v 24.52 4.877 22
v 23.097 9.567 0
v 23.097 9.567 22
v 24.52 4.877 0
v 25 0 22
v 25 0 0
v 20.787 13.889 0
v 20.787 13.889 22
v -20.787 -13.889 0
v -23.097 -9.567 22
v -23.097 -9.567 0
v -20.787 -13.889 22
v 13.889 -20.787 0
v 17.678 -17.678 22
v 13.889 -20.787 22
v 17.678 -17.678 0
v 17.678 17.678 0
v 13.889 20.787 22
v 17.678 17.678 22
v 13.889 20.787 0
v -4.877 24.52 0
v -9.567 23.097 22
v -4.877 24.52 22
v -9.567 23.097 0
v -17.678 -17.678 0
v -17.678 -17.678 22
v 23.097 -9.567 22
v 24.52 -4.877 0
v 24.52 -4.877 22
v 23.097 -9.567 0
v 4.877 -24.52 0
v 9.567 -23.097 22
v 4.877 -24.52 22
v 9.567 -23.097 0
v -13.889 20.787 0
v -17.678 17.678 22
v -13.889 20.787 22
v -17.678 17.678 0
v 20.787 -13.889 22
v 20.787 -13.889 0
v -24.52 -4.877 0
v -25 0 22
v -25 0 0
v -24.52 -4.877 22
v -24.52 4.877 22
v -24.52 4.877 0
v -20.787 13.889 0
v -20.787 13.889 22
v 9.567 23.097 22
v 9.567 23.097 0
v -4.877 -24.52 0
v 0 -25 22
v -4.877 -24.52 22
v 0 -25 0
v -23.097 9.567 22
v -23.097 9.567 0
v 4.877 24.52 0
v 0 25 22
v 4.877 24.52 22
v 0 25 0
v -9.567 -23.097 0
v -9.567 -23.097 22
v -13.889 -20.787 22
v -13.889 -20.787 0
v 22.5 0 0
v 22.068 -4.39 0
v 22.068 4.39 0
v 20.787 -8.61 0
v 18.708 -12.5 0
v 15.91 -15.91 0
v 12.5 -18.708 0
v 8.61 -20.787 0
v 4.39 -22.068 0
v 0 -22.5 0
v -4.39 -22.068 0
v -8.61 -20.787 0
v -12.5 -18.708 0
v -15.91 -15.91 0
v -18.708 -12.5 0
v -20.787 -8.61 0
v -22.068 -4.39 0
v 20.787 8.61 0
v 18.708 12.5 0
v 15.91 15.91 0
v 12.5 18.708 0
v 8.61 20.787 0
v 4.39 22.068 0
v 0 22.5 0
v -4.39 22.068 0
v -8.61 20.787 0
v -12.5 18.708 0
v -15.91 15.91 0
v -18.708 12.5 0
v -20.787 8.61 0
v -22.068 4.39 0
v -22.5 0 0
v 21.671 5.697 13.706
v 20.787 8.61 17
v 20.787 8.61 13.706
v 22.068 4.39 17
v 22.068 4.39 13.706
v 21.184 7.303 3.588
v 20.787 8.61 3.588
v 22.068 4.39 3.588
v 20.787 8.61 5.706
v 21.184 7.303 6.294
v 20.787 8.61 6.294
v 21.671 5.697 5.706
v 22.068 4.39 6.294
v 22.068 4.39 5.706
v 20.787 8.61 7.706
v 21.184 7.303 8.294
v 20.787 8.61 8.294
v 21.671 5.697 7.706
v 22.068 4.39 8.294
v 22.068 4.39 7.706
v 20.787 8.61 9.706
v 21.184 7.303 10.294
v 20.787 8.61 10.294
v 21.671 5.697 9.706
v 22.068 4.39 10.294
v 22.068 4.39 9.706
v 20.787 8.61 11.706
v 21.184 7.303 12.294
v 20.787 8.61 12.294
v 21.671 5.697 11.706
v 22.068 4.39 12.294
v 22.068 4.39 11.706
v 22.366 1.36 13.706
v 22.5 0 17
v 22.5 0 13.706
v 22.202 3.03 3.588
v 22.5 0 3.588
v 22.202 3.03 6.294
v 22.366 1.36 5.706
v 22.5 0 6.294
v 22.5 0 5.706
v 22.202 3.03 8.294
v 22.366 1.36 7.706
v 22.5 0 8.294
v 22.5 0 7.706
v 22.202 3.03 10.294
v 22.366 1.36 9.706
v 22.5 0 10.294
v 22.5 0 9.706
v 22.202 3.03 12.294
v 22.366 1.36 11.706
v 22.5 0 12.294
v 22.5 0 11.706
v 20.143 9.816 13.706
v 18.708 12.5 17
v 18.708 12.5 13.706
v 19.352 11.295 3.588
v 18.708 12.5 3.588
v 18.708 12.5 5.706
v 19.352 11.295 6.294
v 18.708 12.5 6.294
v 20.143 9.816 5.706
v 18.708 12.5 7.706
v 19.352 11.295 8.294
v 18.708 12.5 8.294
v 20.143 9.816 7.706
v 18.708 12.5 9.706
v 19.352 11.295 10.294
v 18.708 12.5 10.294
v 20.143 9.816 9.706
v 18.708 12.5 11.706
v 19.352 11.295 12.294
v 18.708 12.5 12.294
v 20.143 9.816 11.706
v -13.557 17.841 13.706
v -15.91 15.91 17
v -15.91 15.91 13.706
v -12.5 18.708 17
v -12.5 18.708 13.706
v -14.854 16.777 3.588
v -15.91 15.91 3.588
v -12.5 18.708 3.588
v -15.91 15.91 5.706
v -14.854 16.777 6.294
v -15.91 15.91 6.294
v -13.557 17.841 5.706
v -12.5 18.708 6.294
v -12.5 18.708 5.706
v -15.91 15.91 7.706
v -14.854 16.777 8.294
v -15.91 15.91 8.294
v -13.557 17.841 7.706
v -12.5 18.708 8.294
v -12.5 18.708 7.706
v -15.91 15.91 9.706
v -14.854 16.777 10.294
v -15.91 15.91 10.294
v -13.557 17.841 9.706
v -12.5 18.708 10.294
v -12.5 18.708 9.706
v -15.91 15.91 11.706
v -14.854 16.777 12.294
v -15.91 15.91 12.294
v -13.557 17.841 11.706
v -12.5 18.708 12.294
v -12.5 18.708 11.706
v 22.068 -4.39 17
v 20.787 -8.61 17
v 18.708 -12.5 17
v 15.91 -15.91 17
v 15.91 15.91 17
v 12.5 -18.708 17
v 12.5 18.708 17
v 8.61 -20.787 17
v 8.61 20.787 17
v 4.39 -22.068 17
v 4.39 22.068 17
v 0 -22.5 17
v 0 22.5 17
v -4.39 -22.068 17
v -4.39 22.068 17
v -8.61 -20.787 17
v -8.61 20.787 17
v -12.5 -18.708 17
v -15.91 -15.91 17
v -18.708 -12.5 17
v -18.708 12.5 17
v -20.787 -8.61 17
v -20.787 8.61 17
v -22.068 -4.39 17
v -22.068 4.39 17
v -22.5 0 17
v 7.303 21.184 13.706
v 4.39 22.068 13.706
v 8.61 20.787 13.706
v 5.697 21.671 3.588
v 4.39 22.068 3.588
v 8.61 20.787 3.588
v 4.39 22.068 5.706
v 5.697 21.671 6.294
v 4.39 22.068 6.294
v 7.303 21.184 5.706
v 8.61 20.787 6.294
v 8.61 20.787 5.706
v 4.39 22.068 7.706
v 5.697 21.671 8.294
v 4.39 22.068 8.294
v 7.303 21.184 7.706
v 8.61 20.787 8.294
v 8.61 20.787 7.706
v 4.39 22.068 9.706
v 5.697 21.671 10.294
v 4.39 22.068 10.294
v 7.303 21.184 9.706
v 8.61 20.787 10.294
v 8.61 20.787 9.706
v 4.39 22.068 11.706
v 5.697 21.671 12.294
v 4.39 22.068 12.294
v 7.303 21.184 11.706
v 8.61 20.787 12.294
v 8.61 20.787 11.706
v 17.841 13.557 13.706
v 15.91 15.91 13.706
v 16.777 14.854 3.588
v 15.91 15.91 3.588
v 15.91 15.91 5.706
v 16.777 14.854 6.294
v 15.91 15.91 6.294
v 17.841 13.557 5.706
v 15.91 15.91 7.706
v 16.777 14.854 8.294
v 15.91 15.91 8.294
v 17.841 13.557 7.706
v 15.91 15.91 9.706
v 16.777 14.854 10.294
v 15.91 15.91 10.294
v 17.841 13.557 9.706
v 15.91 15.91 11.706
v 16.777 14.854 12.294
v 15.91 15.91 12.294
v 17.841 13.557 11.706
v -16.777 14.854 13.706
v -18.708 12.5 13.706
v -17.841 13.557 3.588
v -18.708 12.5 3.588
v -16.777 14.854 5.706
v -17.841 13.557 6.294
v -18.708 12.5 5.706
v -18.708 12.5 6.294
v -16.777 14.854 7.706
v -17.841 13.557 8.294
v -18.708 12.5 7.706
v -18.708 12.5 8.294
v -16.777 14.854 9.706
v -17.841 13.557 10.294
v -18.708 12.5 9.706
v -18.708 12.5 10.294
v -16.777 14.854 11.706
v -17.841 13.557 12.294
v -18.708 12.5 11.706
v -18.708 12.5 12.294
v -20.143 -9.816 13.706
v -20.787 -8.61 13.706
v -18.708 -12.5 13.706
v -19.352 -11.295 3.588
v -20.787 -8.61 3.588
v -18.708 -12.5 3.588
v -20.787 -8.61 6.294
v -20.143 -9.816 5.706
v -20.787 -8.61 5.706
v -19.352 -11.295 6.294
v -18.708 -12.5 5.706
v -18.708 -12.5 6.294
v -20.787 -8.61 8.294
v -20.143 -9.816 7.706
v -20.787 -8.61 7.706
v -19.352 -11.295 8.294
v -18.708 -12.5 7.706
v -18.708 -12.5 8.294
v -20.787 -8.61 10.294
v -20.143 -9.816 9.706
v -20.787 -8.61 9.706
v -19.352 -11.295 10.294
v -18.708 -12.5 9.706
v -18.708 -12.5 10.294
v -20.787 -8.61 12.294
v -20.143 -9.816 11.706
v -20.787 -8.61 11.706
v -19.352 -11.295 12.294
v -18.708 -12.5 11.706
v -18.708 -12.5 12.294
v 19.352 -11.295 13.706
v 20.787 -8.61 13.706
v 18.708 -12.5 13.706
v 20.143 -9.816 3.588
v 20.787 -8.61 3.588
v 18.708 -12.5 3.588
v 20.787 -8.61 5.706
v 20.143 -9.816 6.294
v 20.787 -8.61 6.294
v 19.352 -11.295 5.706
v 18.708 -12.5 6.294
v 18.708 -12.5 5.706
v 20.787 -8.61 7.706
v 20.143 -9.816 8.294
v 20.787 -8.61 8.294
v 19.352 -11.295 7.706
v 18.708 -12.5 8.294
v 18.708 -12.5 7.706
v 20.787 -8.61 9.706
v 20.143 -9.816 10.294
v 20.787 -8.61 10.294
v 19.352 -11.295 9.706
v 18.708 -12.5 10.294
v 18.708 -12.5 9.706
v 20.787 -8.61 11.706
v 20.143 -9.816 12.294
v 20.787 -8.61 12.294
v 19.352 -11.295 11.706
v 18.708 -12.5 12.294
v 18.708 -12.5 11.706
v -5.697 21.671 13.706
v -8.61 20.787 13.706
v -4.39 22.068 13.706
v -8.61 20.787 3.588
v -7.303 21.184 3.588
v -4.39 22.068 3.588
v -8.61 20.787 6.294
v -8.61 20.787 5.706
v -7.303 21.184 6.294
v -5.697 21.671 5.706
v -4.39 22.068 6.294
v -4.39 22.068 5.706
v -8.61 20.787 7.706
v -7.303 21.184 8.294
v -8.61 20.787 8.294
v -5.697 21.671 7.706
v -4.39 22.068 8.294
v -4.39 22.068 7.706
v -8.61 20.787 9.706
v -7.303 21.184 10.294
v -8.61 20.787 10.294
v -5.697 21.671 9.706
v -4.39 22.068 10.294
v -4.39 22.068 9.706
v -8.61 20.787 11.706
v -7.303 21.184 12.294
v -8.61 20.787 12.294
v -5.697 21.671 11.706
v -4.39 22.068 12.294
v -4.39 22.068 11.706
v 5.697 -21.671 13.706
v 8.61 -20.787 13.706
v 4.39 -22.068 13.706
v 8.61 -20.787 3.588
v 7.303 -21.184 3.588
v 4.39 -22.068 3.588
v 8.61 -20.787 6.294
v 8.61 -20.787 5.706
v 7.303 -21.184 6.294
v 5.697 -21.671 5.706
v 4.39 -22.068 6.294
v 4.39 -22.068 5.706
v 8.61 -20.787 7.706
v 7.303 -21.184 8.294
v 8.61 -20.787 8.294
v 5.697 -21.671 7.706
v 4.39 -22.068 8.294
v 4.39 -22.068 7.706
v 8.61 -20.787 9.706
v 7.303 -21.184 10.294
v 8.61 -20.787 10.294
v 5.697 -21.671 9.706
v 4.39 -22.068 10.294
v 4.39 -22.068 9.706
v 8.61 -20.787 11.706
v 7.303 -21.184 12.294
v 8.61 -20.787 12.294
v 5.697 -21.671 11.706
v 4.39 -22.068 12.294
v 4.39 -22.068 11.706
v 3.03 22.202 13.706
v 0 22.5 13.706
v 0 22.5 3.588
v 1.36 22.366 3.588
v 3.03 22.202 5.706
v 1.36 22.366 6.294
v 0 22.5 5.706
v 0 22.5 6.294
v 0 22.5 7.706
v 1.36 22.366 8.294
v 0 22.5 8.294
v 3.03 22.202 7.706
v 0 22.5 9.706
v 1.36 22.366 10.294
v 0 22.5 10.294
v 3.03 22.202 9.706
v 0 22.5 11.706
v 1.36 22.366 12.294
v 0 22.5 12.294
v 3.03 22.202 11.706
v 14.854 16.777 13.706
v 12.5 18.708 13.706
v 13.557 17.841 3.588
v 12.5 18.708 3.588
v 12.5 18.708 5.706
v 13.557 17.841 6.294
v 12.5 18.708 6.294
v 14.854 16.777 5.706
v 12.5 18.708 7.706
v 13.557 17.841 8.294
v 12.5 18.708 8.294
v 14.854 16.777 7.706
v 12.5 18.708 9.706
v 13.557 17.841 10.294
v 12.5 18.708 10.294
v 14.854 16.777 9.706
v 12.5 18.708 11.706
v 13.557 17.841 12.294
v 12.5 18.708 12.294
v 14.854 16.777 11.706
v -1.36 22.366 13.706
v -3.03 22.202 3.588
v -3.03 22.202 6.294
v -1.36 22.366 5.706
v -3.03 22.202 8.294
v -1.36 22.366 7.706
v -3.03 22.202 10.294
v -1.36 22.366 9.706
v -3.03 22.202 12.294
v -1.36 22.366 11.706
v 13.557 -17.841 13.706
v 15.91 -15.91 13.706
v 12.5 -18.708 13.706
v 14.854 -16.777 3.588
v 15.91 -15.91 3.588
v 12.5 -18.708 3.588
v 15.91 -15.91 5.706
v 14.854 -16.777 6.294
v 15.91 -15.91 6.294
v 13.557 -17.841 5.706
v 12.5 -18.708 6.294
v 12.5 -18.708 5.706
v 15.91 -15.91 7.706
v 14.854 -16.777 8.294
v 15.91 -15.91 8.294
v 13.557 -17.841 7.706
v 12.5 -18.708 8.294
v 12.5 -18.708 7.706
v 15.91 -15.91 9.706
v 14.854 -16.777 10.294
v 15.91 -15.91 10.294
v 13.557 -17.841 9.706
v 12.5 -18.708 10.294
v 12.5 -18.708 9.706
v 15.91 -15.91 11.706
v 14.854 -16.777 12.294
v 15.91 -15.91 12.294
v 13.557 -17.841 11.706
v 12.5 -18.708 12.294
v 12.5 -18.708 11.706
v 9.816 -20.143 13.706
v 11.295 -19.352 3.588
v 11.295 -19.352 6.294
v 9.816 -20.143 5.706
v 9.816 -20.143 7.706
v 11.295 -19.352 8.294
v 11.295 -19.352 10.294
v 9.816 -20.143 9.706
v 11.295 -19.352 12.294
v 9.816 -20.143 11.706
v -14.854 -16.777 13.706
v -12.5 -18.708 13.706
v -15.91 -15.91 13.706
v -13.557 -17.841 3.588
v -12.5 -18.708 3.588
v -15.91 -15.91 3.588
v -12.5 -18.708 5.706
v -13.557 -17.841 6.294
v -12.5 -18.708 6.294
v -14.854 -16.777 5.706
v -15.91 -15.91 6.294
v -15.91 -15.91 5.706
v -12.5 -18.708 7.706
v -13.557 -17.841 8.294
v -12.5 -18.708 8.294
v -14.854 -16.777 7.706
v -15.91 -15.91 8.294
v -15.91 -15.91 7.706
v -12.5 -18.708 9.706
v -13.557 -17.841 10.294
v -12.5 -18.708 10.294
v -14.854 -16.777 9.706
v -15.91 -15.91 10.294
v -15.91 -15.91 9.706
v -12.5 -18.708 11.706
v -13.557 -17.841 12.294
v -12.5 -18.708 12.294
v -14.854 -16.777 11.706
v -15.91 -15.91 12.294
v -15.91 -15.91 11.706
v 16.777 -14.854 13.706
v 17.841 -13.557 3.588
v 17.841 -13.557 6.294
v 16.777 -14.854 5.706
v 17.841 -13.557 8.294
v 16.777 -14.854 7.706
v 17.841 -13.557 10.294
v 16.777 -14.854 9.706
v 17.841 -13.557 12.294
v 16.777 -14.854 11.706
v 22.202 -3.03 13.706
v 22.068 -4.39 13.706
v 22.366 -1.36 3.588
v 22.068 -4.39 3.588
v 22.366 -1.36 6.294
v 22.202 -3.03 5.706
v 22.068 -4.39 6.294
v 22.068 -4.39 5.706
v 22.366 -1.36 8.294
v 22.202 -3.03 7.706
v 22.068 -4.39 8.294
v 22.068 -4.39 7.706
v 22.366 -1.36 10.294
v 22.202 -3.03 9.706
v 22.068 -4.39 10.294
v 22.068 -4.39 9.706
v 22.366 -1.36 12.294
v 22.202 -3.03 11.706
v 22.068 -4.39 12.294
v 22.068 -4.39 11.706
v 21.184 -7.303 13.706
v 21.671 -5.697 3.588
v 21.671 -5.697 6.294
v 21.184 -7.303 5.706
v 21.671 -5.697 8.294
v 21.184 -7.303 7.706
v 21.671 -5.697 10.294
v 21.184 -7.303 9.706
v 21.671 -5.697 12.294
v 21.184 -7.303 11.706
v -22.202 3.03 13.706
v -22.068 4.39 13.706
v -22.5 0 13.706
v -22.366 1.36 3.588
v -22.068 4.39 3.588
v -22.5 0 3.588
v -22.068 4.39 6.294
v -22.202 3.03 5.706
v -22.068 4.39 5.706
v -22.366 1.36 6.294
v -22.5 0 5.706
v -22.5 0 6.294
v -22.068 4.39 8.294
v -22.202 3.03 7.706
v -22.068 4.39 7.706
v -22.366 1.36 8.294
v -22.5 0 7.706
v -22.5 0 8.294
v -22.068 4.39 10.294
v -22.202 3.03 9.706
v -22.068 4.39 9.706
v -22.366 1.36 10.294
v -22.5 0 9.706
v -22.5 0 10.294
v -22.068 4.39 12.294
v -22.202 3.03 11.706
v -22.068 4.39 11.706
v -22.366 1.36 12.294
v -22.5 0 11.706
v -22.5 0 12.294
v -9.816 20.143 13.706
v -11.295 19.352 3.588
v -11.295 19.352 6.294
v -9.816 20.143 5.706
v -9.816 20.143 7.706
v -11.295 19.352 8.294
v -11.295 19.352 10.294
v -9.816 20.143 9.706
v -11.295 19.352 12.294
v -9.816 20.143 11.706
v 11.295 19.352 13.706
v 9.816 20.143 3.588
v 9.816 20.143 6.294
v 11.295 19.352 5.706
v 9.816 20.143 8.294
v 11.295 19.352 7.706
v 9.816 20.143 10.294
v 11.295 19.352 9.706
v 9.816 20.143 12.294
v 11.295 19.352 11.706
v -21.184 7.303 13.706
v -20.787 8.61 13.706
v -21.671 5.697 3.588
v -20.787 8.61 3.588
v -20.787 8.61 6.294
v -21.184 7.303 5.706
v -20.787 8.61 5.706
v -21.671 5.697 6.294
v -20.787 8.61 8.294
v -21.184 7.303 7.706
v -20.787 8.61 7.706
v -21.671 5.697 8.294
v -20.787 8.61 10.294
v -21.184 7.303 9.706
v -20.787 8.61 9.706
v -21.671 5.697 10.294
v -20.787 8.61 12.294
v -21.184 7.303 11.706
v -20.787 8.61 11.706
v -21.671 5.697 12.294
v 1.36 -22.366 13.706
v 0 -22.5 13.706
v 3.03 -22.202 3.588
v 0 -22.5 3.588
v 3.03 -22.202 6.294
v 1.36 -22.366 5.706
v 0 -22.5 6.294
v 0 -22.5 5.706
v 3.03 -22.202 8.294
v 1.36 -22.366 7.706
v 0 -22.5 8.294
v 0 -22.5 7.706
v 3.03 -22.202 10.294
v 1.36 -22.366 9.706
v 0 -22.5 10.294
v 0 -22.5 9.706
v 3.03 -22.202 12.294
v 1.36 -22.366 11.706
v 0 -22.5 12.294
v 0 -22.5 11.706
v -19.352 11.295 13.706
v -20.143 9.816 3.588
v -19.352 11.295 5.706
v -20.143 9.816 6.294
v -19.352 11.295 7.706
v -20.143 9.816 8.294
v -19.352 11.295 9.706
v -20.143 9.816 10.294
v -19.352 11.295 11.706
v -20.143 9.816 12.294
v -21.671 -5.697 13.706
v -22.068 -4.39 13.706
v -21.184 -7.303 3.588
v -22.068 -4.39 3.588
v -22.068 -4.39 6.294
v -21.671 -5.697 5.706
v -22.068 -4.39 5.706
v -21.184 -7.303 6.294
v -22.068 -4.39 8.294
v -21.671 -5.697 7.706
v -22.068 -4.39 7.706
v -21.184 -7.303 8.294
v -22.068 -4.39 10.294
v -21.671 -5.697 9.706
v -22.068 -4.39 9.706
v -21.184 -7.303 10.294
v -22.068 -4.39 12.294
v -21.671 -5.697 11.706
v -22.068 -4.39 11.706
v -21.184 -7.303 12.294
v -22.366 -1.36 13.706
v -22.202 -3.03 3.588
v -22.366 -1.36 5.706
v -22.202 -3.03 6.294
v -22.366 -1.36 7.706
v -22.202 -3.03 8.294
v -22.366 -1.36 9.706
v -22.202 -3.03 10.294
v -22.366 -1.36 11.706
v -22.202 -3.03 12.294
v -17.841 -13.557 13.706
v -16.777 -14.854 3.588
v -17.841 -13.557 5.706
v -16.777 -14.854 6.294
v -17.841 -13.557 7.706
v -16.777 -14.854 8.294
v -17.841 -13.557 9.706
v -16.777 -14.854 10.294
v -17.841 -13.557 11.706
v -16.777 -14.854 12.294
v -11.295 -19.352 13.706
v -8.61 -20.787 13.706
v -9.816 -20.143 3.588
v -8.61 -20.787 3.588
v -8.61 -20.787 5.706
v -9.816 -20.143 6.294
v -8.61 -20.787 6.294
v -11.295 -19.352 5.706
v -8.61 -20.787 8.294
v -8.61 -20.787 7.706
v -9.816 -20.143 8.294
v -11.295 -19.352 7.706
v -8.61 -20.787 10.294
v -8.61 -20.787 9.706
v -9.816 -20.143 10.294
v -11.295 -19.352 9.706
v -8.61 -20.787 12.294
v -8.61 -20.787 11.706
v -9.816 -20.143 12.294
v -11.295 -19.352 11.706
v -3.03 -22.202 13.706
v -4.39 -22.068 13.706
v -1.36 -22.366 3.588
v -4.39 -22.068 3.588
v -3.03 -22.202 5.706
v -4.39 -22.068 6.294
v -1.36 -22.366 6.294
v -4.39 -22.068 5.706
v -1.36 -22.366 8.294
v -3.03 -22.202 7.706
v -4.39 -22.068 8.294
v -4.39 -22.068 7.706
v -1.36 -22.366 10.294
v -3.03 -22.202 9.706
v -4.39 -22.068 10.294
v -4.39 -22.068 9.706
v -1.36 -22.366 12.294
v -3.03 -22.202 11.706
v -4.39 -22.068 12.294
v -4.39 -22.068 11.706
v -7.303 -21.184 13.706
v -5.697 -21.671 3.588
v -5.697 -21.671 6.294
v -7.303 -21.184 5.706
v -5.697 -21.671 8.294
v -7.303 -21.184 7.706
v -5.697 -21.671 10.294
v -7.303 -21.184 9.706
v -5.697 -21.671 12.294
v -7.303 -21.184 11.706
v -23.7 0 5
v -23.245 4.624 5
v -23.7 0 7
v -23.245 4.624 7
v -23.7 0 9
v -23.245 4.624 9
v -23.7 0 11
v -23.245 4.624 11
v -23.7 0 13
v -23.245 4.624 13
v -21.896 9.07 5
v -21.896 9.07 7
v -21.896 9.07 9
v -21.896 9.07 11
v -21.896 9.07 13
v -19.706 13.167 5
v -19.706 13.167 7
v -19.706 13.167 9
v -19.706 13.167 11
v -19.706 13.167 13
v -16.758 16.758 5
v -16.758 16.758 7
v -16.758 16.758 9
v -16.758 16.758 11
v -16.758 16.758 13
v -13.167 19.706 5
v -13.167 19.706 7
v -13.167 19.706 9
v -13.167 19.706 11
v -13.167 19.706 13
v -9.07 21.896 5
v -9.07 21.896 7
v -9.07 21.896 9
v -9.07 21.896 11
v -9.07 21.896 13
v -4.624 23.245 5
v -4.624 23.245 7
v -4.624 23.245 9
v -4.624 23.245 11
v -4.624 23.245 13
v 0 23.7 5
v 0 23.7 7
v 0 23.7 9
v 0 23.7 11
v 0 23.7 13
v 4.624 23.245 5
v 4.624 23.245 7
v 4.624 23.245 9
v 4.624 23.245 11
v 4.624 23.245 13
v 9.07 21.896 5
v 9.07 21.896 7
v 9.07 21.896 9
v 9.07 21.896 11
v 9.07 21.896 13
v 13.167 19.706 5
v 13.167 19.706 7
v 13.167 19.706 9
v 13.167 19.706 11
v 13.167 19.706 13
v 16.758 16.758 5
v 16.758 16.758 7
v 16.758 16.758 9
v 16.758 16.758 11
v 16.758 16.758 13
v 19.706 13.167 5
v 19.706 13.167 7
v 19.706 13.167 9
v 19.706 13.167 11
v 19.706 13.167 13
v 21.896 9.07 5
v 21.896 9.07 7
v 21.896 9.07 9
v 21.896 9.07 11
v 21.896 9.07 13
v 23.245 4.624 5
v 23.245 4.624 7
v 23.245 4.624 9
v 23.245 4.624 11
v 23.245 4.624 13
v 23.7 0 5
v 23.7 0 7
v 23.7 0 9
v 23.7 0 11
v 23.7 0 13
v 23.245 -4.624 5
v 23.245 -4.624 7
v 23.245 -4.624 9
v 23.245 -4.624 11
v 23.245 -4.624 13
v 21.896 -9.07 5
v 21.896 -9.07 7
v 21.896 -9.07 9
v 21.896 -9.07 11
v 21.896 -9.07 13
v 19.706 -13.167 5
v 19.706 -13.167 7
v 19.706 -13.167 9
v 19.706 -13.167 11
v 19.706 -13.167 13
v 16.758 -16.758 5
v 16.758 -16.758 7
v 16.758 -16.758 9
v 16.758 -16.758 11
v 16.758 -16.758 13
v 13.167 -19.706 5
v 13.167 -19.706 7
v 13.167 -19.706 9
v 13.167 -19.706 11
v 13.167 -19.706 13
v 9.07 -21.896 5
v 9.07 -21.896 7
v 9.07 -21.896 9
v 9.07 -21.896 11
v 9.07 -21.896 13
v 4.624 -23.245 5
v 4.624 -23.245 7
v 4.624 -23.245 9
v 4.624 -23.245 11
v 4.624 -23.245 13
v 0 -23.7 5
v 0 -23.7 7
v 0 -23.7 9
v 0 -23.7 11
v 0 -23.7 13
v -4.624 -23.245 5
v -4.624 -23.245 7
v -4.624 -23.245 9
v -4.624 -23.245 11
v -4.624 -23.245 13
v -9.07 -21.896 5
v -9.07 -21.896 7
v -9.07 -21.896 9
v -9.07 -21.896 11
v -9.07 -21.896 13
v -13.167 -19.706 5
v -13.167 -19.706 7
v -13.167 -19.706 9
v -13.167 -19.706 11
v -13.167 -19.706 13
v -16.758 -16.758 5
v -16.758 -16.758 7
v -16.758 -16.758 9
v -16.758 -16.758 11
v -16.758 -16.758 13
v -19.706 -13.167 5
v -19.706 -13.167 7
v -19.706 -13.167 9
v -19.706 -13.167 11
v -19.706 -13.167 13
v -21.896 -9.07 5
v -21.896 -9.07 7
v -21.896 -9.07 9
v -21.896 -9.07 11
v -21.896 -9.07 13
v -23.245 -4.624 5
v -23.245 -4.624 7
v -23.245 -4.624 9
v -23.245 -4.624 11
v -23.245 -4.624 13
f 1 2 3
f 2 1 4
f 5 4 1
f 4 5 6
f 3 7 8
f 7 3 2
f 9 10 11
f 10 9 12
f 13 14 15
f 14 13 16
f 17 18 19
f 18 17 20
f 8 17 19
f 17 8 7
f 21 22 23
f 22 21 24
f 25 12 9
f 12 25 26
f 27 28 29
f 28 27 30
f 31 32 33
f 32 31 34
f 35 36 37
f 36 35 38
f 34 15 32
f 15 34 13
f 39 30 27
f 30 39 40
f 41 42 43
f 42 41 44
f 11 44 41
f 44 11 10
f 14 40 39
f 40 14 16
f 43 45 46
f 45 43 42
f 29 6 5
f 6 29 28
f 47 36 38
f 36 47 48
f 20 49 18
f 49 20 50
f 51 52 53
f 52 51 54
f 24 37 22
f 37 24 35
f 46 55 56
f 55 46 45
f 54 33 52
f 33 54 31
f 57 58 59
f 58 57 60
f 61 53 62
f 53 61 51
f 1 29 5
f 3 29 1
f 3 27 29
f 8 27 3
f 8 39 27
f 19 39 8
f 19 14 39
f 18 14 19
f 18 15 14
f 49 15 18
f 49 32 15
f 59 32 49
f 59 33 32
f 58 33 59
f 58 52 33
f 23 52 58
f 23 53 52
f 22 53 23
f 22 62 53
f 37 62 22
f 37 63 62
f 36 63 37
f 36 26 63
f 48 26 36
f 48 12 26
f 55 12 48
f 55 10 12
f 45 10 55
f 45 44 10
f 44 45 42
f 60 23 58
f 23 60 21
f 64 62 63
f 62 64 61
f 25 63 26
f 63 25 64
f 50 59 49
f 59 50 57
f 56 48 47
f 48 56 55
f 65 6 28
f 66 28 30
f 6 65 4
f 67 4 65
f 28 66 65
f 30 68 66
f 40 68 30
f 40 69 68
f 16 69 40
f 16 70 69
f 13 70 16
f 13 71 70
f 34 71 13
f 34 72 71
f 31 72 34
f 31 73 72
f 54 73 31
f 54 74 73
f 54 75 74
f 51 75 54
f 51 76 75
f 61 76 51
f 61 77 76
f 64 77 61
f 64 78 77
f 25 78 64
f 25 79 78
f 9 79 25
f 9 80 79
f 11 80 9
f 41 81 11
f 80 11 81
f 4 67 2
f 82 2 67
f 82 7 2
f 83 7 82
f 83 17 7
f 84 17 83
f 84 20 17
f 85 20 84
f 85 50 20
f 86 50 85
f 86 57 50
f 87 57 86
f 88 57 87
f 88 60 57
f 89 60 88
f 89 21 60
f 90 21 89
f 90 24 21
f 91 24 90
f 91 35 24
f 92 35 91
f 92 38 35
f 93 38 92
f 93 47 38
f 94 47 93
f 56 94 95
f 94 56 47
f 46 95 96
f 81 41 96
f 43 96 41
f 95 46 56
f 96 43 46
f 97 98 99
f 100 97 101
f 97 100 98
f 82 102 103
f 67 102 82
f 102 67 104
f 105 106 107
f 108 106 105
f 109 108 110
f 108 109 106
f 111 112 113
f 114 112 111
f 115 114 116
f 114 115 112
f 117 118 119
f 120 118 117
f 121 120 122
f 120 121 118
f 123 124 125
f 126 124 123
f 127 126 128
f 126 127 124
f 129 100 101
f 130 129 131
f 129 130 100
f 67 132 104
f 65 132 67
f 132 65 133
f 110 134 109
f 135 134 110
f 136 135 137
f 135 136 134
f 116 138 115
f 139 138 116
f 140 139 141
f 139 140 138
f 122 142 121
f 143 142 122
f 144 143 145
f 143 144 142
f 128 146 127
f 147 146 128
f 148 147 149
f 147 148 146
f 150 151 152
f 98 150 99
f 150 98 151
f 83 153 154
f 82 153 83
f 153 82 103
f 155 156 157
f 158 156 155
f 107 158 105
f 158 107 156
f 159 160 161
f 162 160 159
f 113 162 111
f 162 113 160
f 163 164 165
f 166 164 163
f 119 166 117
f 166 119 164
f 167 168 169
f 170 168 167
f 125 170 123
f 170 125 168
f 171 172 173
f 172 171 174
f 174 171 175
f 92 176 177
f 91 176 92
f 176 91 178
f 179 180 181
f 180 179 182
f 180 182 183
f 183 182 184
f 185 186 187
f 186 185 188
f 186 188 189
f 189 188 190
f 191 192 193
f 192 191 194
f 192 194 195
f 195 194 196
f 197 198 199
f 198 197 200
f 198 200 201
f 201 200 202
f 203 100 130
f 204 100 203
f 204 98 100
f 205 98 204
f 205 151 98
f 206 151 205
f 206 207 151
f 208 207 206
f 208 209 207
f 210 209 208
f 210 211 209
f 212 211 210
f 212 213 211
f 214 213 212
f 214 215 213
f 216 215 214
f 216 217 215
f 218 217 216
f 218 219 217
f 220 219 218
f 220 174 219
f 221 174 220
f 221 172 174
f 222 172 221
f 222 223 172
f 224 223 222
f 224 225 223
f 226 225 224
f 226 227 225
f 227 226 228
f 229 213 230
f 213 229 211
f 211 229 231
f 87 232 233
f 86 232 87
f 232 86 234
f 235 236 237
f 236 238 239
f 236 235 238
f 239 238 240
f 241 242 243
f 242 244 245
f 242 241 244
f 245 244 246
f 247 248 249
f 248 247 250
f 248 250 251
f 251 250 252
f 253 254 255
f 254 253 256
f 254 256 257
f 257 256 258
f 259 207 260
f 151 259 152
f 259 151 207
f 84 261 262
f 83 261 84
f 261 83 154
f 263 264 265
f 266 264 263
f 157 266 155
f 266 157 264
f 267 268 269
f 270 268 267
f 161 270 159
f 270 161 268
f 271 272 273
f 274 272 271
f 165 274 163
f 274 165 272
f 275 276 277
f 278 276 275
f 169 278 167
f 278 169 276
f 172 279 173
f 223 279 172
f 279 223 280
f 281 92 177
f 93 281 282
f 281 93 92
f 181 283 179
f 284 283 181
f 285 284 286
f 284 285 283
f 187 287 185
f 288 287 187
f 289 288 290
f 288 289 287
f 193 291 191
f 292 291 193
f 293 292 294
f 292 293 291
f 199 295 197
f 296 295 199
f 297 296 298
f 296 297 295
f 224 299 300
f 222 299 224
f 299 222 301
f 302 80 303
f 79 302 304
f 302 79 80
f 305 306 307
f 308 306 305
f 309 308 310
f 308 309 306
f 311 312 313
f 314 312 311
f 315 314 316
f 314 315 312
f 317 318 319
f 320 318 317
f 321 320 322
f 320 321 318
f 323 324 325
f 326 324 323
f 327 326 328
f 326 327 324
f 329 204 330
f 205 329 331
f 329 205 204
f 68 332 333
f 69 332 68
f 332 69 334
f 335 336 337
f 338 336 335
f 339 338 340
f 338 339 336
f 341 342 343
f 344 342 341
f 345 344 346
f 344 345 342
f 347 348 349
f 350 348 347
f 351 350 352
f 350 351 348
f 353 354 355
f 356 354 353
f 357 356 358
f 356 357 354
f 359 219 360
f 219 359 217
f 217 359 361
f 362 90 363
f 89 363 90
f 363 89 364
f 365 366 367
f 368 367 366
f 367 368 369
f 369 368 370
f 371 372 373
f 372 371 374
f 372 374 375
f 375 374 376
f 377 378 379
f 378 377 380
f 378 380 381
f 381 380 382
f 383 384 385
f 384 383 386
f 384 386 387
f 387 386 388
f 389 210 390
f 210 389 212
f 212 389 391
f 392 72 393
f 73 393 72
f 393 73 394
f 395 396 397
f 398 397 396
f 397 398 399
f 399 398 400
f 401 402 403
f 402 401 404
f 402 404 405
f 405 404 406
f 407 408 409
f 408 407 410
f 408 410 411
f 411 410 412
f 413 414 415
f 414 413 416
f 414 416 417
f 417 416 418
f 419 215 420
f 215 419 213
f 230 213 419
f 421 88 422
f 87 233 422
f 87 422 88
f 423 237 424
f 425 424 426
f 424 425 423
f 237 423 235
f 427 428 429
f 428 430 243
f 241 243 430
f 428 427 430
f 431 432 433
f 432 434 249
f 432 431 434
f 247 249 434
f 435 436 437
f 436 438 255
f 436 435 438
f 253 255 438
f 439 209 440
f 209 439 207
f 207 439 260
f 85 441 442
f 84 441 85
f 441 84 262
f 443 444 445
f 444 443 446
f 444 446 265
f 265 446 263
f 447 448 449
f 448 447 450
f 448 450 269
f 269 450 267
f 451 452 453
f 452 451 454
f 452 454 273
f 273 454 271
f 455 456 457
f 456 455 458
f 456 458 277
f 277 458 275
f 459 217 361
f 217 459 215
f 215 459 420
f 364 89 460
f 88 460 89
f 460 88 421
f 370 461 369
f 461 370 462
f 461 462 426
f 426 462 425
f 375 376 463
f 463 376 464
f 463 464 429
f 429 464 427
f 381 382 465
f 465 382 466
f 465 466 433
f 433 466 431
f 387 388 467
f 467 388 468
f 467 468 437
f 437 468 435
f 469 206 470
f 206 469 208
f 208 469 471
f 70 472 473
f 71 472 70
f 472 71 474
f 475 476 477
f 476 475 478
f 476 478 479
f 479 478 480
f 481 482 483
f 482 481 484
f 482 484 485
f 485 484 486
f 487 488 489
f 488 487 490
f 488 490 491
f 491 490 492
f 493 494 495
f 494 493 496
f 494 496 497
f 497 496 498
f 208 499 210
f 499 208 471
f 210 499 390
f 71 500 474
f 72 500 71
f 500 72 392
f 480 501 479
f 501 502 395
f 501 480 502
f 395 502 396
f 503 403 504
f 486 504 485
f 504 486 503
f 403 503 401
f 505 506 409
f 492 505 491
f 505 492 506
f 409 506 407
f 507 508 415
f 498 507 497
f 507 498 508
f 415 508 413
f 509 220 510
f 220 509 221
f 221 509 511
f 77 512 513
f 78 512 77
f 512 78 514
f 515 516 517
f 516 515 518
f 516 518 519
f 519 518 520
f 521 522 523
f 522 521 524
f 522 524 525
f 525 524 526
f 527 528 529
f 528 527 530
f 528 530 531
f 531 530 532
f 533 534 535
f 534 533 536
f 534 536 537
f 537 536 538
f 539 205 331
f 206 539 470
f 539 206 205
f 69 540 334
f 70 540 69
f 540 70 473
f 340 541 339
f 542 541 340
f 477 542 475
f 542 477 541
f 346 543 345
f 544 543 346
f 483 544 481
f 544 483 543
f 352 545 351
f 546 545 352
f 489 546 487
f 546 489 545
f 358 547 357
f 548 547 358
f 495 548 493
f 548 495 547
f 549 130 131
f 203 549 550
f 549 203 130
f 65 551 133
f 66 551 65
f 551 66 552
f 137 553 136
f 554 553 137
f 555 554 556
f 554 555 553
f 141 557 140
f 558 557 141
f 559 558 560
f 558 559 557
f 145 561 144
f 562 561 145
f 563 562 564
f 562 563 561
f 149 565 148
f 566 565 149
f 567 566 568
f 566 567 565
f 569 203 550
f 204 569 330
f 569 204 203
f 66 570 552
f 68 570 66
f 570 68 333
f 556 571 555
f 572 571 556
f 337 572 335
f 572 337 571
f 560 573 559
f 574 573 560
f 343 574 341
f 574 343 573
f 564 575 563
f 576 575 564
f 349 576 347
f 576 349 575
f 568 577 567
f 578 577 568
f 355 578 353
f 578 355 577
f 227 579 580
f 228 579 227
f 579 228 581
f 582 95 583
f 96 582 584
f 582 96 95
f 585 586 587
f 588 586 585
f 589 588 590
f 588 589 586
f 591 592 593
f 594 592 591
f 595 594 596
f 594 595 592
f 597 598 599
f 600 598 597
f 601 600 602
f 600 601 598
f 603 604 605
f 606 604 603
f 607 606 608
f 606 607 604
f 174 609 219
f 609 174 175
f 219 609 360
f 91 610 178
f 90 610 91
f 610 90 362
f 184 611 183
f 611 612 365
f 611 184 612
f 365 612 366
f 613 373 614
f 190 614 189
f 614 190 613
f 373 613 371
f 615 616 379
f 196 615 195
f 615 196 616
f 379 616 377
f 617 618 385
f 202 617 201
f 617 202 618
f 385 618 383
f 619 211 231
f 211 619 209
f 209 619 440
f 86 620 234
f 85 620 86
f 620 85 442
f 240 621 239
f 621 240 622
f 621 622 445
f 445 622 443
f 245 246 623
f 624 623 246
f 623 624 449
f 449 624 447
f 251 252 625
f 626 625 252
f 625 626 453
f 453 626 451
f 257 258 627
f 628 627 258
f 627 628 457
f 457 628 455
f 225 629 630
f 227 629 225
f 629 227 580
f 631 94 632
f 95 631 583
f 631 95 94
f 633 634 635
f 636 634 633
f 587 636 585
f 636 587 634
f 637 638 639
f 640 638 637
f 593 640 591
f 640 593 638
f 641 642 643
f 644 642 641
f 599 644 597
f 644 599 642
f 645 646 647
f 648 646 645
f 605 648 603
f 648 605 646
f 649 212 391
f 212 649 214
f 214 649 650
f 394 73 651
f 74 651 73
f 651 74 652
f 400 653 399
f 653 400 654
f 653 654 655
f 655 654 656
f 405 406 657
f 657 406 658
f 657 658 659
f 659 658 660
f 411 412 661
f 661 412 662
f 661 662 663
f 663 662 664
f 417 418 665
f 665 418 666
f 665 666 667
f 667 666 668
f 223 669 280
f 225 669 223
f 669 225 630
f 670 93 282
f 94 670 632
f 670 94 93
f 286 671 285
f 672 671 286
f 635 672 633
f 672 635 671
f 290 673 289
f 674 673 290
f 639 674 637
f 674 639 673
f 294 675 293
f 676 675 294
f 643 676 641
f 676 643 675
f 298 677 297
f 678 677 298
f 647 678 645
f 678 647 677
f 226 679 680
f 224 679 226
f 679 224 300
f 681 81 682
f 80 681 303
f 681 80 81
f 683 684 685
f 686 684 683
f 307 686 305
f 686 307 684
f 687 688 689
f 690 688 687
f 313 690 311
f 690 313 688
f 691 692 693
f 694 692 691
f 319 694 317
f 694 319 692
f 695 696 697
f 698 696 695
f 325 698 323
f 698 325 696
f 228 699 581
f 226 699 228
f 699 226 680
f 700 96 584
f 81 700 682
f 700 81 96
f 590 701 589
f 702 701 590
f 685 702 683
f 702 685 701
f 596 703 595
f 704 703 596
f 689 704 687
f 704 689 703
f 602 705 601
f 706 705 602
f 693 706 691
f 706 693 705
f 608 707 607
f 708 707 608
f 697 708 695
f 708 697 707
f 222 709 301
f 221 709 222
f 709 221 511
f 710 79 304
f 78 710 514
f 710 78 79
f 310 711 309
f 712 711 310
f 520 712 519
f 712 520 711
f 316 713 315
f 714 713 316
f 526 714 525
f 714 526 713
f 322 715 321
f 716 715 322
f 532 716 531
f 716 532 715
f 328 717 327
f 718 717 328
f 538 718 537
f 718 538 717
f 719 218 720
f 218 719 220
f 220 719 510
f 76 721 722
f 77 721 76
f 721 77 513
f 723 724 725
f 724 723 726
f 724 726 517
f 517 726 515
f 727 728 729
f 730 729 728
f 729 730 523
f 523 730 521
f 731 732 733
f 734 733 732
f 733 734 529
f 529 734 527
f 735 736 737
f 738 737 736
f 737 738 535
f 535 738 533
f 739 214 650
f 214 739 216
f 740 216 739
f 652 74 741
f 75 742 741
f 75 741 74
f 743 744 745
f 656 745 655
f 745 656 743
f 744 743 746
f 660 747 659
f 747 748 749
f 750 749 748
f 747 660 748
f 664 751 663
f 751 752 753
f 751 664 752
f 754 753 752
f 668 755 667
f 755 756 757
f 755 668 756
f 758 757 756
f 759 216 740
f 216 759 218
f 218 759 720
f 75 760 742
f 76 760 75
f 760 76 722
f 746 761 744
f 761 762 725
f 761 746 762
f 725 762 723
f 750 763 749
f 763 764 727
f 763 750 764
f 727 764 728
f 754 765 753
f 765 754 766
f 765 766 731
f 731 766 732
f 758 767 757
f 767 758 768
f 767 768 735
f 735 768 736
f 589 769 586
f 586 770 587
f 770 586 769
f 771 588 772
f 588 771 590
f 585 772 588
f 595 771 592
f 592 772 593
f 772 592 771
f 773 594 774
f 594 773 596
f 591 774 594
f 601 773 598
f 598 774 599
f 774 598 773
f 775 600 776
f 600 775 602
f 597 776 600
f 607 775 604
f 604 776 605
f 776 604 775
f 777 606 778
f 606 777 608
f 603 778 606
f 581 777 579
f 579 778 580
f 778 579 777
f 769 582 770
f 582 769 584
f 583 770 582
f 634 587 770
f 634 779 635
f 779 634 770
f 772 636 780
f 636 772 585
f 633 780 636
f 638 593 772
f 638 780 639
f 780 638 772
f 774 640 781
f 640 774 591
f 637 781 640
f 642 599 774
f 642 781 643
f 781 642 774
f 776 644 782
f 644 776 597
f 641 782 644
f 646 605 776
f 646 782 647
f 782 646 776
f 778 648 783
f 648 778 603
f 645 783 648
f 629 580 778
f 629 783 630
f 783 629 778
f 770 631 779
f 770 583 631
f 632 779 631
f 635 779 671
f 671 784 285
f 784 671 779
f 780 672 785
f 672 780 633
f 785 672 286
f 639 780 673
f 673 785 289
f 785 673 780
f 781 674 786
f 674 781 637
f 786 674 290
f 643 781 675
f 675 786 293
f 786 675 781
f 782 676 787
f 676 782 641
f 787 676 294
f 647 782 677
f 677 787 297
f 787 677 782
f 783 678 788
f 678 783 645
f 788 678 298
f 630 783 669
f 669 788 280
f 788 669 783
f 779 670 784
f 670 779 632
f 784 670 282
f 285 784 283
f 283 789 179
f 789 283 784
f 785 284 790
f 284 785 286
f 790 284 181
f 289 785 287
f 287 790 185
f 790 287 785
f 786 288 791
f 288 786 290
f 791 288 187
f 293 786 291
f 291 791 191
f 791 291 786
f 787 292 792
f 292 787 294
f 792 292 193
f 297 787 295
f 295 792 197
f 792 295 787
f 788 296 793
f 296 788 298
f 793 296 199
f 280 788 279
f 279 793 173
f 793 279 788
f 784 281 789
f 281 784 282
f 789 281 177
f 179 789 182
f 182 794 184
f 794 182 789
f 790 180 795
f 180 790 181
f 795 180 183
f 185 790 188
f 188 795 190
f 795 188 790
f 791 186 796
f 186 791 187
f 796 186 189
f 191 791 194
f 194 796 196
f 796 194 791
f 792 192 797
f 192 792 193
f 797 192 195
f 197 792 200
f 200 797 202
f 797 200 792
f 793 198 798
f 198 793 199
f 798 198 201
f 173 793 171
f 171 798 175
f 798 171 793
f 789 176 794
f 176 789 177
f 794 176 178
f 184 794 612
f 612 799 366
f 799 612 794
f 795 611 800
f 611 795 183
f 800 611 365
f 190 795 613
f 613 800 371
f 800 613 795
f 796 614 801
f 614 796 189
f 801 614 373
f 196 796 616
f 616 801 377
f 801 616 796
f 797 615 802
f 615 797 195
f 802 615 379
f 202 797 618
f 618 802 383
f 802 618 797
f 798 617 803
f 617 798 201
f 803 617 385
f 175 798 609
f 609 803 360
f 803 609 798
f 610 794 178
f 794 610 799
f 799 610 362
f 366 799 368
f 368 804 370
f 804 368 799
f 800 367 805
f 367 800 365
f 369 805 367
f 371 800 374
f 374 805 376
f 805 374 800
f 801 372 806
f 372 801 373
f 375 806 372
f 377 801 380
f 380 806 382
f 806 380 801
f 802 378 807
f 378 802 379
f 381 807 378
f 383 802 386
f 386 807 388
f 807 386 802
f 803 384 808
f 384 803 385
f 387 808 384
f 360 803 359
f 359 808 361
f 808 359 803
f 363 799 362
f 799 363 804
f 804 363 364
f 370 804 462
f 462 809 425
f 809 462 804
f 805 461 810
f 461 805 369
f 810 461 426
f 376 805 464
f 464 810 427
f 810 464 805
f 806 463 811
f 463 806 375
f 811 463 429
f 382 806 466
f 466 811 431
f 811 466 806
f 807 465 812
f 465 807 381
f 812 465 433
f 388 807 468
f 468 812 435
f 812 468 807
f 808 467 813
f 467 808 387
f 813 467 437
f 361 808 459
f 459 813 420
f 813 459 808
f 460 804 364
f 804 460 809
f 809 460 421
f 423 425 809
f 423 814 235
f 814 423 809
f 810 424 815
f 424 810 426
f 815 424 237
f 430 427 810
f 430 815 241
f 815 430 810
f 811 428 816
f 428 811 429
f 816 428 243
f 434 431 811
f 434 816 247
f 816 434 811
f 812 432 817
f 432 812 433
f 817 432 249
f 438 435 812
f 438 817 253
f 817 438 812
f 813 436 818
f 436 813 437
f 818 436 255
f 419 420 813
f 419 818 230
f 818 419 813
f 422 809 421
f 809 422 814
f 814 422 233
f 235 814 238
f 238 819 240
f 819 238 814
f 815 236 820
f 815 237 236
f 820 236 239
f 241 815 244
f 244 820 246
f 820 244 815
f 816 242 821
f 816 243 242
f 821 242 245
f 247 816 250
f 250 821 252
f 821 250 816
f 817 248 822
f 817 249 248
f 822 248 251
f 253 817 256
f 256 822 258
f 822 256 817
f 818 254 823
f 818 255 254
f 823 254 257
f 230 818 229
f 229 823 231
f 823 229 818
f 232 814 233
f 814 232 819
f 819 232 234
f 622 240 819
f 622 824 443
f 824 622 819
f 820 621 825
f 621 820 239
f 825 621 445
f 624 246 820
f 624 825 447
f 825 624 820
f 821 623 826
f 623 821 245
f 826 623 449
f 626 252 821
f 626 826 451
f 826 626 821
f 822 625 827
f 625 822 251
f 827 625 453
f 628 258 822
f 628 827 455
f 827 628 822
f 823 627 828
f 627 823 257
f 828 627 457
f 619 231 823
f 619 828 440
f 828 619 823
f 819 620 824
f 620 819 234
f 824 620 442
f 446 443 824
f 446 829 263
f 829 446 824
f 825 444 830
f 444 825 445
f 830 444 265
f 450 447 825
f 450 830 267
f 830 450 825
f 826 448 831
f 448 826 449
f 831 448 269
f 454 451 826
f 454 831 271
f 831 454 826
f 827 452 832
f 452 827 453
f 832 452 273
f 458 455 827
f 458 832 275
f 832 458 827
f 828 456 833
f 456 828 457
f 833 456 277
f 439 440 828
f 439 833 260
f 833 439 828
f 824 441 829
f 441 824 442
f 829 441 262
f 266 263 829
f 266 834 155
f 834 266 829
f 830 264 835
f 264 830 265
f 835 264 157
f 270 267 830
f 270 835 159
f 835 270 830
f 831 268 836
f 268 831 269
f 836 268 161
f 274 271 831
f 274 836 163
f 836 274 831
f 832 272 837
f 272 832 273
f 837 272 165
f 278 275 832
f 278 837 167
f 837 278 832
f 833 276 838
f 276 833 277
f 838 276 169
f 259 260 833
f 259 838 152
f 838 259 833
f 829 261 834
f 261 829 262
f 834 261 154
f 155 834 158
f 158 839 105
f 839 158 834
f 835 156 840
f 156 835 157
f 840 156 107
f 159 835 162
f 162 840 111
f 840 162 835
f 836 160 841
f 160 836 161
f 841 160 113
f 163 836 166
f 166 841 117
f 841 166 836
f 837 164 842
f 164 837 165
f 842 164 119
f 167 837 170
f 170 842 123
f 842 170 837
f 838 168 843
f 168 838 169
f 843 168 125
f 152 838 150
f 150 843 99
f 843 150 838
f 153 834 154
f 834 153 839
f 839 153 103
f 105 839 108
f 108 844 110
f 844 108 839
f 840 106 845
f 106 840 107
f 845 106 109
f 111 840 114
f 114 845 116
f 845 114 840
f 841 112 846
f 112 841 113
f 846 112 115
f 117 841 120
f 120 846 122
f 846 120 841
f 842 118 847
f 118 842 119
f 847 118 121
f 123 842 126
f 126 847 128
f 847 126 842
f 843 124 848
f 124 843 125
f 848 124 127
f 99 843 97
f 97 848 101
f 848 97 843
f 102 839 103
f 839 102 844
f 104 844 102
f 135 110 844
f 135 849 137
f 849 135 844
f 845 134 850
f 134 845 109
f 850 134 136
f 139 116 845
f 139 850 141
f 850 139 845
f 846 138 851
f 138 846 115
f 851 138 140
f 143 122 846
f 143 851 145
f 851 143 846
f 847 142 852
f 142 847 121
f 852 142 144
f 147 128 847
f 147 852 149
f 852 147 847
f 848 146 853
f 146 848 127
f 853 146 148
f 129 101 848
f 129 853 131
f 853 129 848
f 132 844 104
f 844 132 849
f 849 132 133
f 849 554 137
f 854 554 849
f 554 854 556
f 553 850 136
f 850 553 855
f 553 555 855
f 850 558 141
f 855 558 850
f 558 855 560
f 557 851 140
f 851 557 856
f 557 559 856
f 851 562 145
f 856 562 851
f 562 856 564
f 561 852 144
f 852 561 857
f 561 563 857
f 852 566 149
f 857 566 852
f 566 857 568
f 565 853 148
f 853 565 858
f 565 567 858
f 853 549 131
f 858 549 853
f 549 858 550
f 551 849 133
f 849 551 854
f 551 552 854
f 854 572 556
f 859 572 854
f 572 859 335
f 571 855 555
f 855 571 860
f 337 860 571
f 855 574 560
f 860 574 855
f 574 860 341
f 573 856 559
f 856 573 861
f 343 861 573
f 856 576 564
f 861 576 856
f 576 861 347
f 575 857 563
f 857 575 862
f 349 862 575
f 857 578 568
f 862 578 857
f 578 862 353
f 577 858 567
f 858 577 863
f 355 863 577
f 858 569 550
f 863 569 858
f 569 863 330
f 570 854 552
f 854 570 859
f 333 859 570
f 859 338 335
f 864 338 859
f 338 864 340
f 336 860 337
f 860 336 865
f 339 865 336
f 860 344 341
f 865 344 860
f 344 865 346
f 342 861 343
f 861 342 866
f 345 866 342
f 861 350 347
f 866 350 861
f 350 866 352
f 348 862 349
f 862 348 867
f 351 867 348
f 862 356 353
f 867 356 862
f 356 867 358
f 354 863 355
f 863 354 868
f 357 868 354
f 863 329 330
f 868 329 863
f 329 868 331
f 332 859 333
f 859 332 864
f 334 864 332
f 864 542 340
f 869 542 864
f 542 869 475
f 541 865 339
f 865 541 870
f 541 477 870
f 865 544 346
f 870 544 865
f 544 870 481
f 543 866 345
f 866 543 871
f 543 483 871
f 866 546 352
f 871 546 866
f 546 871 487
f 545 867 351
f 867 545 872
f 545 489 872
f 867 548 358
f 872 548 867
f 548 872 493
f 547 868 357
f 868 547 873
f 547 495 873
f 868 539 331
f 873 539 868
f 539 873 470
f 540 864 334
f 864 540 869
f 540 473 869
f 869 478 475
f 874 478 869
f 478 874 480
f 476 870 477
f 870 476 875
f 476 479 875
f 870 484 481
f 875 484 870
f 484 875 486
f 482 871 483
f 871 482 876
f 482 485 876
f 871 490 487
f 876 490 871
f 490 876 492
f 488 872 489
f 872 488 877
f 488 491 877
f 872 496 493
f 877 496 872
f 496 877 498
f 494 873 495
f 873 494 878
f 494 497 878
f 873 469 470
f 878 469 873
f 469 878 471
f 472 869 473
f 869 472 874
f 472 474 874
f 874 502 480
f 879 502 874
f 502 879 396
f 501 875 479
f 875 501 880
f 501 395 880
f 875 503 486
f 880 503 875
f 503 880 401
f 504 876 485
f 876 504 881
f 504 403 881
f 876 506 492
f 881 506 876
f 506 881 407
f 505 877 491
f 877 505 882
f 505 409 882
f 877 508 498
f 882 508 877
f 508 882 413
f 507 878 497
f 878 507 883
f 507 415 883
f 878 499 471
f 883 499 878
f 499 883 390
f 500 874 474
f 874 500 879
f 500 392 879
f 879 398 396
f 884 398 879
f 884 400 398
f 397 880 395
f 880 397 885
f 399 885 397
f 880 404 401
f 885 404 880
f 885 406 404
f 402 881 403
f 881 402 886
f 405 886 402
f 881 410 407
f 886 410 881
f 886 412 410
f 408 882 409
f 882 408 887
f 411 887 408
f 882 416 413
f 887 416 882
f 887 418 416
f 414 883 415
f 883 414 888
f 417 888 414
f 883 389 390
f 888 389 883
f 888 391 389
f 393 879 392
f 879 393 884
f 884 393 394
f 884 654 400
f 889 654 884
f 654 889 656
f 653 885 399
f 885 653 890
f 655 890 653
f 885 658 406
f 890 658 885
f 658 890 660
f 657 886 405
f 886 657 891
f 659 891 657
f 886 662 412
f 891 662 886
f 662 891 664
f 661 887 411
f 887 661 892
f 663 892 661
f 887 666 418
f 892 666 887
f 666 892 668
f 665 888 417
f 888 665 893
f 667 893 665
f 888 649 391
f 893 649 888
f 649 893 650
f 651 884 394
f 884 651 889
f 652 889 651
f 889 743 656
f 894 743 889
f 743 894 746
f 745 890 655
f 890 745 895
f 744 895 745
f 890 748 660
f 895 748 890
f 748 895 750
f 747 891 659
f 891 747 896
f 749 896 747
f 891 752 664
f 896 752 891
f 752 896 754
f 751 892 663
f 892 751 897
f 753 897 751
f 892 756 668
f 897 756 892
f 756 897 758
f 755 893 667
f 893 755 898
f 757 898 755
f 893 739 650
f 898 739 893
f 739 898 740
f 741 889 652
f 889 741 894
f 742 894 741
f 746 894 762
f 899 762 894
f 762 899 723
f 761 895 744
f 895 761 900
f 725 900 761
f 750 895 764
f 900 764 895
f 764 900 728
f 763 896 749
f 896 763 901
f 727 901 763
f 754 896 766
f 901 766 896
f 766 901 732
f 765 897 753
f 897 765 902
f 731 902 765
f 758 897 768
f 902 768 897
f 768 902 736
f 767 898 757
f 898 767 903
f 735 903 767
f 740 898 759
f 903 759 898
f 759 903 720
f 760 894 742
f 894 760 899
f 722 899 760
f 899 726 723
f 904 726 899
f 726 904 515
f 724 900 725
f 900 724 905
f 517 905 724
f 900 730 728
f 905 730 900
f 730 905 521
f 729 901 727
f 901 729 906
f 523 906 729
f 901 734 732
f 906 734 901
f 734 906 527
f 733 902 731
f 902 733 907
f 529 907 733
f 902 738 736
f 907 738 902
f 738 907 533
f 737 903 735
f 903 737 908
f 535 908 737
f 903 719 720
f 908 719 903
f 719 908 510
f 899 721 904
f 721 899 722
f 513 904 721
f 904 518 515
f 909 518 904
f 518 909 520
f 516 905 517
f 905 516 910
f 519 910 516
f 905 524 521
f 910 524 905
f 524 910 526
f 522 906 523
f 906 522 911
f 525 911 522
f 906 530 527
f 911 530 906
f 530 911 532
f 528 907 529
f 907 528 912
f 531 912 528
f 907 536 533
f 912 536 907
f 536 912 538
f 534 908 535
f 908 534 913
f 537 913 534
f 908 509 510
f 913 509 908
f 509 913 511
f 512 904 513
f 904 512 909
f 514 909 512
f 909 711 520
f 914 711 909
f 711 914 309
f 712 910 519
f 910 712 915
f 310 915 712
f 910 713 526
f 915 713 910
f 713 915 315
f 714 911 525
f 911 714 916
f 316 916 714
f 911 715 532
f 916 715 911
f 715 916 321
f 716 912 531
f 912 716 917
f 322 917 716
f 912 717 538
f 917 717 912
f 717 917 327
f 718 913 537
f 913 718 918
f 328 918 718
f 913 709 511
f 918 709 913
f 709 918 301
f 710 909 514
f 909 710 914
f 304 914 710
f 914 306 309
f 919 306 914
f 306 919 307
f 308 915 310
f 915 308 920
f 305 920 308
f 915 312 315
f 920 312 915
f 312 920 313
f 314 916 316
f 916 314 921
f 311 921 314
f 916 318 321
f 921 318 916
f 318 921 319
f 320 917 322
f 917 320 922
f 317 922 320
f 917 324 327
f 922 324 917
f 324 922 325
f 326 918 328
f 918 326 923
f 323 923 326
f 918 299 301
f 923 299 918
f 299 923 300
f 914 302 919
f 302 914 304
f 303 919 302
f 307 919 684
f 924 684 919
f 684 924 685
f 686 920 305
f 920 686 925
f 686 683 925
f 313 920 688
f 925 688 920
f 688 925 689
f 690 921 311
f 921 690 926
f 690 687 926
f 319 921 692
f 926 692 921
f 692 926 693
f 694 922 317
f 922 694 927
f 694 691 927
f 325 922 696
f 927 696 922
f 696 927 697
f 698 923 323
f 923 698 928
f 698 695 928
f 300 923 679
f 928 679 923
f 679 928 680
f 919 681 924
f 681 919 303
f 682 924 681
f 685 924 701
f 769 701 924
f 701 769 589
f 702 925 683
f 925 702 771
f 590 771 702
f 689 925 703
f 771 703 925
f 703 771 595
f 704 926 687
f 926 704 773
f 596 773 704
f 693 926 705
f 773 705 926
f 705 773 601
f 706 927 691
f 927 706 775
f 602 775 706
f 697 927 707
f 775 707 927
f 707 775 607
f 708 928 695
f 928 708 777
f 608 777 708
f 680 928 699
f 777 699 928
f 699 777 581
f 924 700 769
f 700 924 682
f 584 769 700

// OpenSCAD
$fn = 32;

// ----------------------------------------------------------------------
// Threaded cap: 50 mm body, 22 mm tall, 45 mm threaded bore
// ----------------------------------------------------------------------

// --- parameters (mm) ---
outer_d = 50;             // cap outside diameter
body_h = 22;              // cap height
top_t = 5;                // closed top thickness
bore_d = 45;              // bore core diameter
pitch = 2;                // thread pitch
thread_d = 1.2;           // thread depth
thread_z = 3;             // thread start above the rim
thread_h = 11;            // threaded height

difference() {
  union() {
    cylinder(h = 22, d = outer_d);
  }
  /* threaded bore, closed at the top */
  translate([0, 0, -2.5]) cylinder(h = 19.5, d = bore_d);
  translate([0, 0, 3]) rotate_extrude() polygon([[21.5, 0], [21.5, 11], [22, 11], [23.7, 10], [22, 9], [23.7, 8], [22, 7], [23.7, 6], [22, 5], [23.7, 4], [22, 3], [23.7, 2], [22, 0], [21.5, 0]]);
}
